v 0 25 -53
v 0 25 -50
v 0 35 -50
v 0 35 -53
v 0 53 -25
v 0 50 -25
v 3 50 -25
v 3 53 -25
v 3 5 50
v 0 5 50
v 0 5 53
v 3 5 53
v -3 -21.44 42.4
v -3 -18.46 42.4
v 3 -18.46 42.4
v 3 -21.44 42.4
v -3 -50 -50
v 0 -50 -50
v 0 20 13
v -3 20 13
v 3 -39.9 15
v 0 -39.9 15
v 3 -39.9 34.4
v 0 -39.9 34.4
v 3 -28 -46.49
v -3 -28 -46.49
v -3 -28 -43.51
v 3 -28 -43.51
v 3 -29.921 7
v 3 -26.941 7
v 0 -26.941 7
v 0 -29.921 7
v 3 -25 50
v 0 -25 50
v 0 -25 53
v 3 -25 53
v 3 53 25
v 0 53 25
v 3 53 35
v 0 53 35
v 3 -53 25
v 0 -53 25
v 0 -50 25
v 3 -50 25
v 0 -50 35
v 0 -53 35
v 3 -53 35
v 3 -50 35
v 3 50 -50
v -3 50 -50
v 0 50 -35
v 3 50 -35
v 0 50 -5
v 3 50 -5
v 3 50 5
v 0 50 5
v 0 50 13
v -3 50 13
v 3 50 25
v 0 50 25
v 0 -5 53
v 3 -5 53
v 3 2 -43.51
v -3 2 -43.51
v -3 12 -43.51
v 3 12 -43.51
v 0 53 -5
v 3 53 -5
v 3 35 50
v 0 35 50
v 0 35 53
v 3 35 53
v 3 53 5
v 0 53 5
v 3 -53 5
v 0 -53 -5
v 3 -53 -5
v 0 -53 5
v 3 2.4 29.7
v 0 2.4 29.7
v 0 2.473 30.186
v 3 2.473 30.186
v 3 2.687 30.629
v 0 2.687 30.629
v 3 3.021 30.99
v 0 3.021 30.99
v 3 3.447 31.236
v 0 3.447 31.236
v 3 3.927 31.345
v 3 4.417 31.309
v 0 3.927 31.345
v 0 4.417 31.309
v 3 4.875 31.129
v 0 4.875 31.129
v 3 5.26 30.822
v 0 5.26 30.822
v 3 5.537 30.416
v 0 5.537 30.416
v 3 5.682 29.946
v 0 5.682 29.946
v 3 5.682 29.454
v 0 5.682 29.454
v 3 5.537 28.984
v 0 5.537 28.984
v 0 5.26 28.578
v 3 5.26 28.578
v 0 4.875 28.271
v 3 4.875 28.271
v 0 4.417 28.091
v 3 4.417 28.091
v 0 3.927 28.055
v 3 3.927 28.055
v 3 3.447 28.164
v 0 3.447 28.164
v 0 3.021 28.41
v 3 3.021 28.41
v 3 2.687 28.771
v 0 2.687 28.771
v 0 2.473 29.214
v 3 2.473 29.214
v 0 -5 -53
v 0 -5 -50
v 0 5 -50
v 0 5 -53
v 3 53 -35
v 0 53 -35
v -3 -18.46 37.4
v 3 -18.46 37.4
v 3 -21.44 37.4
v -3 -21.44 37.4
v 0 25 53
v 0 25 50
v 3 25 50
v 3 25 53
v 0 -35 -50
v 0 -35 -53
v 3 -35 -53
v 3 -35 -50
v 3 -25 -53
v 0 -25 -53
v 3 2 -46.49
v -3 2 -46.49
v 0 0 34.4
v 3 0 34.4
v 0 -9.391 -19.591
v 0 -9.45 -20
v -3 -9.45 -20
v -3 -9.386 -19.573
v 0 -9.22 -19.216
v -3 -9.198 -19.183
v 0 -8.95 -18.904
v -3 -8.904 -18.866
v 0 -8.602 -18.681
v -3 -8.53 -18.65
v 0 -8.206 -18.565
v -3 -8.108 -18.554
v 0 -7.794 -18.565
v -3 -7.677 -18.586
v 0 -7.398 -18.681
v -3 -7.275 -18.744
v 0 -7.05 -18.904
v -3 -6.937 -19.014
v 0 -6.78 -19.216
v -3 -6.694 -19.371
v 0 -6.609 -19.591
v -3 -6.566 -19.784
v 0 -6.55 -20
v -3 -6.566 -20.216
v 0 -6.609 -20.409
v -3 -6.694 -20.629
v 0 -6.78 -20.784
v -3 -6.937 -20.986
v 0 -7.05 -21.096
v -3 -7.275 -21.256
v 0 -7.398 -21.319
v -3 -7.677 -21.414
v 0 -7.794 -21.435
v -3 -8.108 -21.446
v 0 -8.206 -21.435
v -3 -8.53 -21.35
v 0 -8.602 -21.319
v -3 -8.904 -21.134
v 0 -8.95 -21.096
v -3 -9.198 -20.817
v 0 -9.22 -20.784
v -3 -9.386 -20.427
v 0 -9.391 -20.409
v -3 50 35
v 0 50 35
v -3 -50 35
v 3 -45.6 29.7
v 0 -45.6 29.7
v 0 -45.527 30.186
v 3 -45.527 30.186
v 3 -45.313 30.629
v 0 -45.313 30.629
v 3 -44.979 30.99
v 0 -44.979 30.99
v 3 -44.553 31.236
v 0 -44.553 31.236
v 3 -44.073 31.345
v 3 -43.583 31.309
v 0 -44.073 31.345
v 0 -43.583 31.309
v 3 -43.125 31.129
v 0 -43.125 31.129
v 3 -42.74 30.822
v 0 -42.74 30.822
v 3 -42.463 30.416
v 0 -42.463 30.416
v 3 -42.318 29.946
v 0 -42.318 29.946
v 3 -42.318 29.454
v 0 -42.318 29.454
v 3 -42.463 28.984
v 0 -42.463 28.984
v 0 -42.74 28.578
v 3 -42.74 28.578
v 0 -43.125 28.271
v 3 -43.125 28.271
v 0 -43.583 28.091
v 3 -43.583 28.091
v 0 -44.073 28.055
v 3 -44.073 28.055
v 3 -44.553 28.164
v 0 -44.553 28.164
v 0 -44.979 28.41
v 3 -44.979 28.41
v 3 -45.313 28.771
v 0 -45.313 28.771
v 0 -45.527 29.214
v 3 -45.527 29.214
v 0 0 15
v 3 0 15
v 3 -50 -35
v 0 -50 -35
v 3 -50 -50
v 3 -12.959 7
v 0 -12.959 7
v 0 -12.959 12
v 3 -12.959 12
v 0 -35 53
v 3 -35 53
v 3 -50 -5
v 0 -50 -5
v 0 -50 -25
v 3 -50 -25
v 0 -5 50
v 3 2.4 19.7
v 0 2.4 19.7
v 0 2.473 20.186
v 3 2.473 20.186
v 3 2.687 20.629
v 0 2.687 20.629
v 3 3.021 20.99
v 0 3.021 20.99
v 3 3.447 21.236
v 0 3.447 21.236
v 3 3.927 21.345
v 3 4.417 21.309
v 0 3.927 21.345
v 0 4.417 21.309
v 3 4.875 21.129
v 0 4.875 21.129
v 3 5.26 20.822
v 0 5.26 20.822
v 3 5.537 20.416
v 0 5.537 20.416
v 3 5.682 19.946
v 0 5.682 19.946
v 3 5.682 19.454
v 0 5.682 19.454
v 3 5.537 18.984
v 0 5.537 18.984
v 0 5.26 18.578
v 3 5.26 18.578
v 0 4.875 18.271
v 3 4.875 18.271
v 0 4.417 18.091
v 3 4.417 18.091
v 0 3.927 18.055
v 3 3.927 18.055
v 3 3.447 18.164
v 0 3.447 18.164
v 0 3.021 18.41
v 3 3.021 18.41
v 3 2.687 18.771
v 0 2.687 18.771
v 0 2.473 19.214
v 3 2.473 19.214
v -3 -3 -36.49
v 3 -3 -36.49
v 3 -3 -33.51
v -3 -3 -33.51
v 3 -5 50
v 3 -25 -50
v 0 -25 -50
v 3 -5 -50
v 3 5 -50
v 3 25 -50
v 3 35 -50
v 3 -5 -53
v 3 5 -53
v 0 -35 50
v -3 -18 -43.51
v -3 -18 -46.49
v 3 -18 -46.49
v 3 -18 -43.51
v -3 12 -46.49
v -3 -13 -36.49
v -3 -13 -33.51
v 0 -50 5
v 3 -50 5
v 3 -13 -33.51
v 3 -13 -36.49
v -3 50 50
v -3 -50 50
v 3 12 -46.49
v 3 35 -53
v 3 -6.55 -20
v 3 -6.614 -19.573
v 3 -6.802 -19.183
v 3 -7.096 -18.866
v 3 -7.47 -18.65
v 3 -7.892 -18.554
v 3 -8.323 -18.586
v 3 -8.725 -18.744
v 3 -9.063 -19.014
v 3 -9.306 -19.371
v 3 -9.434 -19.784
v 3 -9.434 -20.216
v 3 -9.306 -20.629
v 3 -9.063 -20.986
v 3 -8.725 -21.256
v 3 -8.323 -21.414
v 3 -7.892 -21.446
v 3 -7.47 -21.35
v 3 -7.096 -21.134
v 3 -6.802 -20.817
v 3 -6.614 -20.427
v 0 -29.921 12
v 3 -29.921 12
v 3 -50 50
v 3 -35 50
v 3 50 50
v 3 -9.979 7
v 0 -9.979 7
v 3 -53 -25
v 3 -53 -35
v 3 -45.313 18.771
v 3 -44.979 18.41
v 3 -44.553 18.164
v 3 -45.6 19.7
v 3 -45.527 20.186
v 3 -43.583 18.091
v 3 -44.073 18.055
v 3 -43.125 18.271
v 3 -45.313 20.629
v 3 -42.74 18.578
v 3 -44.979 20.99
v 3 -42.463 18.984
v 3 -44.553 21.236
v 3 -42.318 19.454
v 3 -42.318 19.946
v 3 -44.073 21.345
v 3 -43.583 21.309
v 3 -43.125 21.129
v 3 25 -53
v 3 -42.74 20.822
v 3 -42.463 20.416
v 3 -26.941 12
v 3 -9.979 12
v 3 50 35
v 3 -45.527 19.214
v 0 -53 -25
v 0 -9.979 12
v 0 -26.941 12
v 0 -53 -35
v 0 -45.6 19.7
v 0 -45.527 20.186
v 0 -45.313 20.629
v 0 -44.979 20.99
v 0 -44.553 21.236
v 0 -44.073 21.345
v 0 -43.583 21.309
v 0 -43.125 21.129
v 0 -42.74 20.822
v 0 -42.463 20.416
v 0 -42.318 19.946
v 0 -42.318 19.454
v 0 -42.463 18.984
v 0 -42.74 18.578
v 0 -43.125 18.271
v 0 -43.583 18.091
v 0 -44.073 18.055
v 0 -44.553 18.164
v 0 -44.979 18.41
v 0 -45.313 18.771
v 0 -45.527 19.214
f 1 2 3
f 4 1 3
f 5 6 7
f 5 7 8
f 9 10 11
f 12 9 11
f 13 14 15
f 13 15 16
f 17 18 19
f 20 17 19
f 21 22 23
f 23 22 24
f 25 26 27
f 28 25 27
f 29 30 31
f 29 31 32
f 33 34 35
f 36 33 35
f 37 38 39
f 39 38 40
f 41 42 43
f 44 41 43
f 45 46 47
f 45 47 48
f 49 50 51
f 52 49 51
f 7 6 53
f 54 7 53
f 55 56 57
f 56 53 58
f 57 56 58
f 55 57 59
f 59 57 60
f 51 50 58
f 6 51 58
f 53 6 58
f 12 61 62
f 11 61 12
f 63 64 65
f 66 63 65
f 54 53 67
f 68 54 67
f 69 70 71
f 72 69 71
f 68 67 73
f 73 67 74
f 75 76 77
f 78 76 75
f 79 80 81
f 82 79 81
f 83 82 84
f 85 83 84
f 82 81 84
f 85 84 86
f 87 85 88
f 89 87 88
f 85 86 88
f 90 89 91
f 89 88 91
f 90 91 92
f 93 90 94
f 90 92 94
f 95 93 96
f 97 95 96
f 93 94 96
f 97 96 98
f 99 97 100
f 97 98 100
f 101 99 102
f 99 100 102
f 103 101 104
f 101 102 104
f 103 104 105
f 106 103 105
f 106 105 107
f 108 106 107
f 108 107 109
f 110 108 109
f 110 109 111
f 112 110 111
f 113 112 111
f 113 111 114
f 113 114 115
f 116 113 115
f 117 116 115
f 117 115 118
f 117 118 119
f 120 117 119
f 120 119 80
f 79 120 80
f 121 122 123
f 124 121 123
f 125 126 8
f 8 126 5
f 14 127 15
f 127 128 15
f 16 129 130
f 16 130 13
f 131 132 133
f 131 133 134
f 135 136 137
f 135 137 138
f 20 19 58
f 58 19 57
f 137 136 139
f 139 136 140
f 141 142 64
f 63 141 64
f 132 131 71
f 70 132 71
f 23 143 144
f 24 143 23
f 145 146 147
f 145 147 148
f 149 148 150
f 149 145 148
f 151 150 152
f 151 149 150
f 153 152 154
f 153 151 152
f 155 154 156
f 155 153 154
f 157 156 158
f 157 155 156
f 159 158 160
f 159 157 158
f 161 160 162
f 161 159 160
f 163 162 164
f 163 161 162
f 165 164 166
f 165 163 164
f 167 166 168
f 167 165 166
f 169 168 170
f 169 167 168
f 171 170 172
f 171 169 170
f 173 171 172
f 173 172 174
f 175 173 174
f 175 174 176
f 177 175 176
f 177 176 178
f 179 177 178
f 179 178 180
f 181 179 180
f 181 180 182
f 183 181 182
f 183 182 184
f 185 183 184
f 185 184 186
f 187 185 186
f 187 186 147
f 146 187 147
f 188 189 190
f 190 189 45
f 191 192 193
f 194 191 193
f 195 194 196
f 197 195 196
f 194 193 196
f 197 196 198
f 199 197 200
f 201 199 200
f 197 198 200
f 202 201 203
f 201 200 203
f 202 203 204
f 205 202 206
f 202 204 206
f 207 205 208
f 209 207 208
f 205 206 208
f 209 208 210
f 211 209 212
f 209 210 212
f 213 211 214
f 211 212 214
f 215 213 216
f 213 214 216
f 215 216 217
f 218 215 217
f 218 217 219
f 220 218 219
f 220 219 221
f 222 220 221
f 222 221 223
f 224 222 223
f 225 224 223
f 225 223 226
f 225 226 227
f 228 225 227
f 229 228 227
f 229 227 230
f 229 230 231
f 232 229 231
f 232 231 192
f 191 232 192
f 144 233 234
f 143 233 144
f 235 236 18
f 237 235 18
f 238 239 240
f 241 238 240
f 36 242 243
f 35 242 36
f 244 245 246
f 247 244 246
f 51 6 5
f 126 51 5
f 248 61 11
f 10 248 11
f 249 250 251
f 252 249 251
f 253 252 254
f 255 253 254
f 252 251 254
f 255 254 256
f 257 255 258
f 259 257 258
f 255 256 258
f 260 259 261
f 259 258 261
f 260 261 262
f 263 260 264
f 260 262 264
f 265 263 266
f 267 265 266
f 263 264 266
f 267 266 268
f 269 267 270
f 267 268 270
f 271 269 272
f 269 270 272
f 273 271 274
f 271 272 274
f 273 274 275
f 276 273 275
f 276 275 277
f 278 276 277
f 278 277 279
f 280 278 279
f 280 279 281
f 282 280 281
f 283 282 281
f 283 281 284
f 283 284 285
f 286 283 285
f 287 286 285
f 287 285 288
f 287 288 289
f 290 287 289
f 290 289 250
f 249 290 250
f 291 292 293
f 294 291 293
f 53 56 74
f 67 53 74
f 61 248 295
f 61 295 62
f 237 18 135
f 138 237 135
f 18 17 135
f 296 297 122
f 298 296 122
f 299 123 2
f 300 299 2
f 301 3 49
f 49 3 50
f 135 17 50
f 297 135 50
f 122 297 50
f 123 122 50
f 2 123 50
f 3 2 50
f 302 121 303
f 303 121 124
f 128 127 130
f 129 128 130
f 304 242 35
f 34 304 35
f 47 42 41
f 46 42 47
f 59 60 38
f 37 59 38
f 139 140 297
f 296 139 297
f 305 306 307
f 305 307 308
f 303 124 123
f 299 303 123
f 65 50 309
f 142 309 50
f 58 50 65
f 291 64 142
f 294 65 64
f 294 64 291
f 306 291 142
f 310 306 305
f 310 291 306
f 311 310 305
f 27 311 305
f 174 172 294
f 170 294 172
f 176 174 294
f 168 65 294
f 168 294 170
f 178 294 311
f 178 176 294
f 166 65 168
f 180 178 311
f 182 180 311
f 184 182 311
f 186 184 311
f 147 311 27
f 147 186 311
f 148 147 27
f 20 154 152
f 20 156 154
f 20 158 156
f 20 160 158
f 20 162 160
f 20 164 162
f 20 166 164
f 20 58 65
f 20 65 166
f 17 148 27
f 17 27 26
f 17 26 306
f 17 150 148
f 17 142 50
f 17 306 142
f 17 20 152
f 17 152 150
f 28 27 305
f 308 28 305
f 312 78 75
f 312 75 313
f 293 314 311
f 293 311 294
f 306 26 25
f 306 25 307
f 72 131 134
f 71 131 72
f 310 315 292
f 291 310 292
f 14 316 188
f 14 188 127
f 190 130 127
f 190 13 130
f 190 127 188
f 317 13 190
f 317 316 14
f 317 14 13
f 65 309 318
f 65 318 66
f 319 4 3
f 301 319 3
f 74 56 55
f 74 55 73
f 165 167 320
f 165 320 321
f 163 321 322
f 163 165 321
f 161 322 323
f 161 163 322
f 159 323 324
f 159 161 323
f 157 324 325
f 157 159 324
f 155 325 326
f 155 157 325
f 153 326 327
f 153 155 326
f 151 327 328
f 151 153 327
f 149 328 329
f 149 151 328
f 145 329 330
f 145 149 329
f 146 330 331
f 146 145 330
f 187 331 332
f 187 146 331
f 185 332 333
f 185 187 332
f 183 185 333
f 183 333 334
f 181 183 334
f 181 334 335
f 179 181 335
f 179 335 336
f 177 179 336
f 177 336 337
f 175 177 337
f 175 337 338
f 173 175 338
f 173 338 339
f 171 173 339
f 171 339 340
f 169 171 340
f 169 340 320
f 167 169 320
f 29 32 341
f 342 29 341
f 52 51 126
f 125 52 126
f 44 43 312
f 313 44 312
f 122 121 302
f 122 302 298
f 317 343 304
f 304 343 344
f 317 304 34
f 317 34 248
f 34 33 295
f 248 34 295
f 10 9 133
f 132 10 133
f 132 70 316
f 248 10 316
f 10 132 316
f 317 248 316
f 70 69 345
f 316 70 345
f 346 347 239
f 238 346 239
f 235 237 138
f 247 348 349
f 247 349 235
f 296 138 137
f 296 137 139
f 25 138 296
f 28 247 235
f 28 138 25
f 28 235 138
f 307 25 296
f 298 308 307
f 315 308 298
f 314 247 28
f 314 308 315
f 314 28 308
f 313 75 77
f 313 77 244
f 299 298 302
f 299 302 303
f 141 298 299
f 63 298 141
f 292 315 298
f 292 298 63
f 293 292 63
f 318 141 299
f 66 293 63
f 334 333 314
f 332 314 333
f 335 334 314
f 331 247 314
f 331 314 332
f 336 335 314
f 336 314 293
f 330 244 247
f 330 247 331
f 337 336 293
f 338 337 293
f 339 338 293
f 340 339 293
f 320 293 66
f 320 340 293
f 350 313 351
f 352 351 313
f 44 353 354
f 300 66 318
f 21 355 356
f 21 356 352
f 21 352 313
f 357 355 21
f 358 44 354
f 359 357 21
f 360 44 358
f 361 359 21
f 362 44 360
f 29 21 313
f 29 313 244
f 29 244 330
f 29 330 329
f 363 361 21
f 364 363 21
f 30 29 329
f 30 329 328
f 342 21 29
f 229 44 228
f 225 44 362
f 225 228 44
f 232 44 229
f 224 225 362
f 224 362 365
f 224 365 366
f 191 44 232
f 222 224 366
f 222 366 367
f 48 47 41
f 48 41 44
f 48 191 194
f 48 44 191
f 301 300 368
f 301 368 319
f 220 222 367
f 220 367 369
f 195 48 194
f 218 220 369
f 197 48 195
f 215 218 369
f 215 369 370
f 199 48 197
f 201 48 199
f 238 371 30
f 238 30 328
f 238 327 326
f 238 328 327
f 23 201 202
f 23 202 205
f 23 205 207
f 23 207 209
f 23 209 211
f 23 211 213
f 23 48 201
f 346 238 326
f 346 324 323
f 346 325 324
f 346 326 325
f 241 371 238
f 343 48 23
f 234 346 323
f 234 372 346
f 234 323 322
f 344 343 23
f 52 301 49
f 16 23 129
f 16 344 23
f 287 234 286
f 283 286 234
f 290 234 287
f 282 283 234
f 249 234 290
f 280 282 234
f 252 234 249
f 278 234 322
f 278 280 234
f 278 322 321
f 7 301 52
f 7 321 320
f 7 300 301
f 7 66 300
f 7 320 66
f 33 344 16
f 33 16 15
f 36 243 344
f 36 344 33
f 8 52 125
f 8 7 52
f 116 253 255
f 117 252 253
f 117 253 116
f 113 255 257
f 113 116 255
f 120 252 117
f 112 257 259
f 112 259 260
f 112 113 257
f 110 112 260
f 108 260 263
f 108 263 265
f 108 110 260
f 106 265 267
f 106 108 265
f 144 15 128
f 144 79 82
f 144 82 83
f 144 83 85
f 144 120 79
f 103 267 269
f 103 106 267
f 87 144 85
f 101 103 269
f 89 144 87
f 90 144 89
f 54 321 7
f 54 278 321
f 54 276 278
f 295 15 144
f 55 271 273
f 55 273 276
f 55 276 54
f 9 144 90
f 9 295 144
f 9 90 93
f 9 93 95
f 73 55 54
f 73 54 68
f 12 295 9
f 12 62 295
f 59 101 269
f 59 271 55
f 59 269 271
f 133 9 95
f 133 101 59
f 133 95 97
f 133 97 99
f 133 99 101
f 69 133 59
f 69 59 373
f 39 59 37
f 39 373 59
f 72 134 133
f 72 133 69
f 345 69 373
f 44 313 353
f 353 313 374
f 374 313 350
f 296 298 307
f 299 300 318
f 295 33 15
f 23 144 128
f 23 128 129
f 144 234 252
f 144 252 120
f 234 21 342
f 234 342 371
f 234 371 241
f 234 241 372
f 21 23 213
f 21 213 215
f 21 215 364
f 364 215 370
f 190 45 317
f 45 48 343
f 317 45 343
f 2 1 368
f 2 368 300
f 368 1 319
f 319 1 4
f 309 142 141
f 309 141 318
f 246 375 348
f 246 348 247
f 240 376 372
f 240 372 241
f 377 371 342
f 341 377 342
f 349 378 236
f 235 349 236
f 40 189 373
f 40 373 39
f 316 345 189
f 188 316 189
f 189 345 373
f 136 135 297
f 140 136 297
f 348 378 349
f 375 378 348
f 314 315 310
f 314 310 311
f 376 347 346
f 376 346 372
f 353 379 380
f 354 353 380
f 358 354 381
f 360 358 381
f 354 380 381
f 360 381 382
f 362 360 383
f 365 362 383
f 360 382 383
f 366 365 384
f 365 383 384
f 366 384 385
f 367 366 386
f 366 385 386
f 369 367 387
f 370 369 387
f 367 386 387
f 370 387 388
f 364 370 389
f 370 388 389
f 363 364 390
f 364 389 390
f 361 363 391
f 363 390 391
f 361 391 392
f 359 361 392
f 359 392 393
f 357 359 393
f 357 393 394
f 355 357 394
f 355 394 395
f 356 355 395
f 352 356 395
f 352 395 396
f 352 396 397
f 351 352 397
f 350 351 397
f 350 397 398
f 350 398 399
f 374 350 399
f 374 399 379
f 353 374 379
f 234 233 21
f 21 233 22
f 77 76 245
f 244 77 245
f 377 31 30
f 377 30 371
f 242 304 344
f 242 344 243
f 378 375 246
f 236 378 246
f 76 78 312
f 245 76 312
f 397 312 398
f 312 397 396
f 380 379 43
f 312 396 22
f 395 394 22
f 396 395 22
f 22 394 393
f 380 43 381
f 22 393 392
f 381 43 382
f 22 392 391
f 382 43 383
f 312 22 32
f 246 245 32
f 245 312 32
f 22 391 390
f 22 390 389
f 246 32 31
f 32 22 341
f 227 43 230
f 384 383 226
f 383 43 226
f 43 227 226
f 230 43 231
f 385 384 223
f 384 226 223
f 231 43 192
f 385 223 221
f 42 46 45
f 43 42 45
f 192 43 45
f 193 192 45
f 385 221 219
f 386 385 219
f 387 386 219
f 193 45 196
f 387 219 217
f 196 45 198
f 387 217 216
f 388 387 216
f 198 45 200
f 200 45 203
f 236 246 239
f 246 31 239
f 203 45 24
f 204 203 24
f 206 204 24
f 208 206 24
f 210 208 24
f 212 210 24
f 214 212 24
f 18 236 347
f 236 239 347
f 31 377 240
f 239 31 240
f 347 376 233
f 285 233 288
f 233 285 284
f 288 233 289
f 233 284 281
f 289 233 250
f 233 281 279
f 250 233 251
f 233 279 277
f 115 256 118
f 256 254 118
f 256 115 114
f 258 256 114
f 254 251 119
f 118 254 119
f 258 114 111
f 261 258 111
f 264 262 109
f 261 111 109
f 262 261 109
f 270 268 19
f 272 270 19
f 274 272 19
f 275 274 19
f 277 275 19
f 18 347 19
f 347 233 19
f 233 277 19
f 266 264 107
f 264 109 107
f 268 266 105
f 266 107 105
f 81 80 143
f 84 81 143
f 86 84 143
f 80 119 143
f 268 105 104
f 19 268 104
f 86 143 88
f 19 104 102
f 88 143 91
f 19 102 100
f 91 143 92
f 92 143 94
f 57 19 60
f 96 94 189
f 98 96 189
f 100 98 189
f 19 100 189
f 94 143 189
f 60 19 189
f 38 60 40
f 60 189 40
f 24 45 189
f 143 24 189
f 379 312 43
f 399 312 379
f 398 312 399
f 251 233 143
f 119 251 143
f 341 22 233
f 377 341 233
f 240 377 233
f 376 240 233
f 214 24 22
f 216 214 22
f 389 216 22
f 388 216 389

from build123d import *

# Parameters (mm, degrees)
F0_R     = 1.45
F0_W     = 10
F0_H     = 3
F0_W_2   = 3
F0_H_2   = 10
F1_DEPTH = 3
F2_R     = 1.65
F2_W     = 2.98
F2_H     = 5
F2_W_2   = 39.9
F2_H_2   = 19.4
F3_DEPTH = 25
F2_R_2   = 1.45
F4_DEPTH = 3
F5_W     = 10
F5_H     = 2.98
F6_DEPTH = 12.5


with BuildPart() as f1:
    # F0 (on Right) → F1 (new body)
    with BuildSketch(Plane.YZ):
        Polygon((-35, 50), (-50, 50), (-50, 35), (-47, 35), (-47, 25), (-50, 25), (-50, 5), (-47, 5), (-47, -5), (-50, -5), (-50, -25), (-47, -25), (-47, -35), (-50, -35), (-50, -50), (-35, -50), (-35, -47), (-25, -47), (-25, -50), (-5, -50), (-5, -47), (5, -47), (5, -50), (25, -50), (25, -47), (35, -47), (35, -50), (50, -50), (50, -35), (47, -35), (47, -25), (50, -25), (50, -5), (47, -5), (47, 5), (50, 5), (50, 25), (47, 25), (47, 35), (50, 35), (50, 50), (35, 50), (35, 47), (25, 47), (25, 50), (5, 50), (5, 47), (-5, 47), (-5, 50), (-25, 50), (-25, 47), (-35, 47), align=None)
        with Locations((-8, -20)):
            Circle(F0_R, mode=Mode.SUBTRACT)
        with Locations((-30, 51.5)):
            Rectangle(F0_W, F0_H)
        with Locations((-30, 48.5)):
            Rectangle(F0_W, F0_H)
        with Locations((-48.5, 30)):
            Rectangle(F0_W_2, F0_H_2)
        with Locations((-51.5, 30)):
            Rectangle(F0_W_2, F0_H_2)
        with Locations((0, 51.5)):
            Rectangle(F0_W, F0_H)
        with Locations((0, 48.5)):
            Rectangle(F0_W, F0_H)
        with Locations((-48.5, 0)):
            Rectangle(F0_W_2, F0_H_2)
        with Locations((-51.5, 0)):
            Rectangle(F0_W_2, F0_H_2)
        with Locations((30, 51.5)):
            Rectangle(F0_W, F0_H)
        with Locations((30, 48.5)):
            Rectangle(F0_W, F0_H)
        with Locations((-48.5, -30)):
            Rectangle(F0_W_2, F0_H_2)
        with Locations((-51.5, -30)):
            Rectangle(F0_W_2, F0_H_2)
        with Locations((51.5, 30)):
            Rectangle(F0_W_2, F0_H_2)
        with Locations((48.5, 30)):
            Rectangle(F0_W_2, F0_H_2)
        with Locations((-30, -48.5)):
            Rectangle(F0_W, F0_H)
        with Locations((-30, -51.5)):
            Rectangle(F0_W, F0_H)
        with Locations((51.5, 0)):
            Rectangle(F0_W_2, F0_H_2)
        with Locations((48.5, 0)):
            Rectangle(F0_W_2, F0_H_2)
        with Locations((0, -48.5)):
            Rectangle(F0_W, F0_H)
        with Locations((0, -51.5)):
            Rectangle(F0_W, F0_H)
        with Locations((51.5, -30)):
            Rectangle(F0_W_2, F0_H_2)
        with Locations((48.5, -30)):
            Rectangle(F0_W_2, F0_H_2)
        with Locations((30, -48.5)):
            Rectangle(F0_W, F0_H)
        with Locations((30, -51.5)):
            Rectangle(F0_W, F0_H)
    extrude(amount=F1_DEPTH)

    # F2 (on face) → F3 (cut)
    with BuildSketch(Plane(origin=(0, 0, 0), x_dir=(0, -1, 0), z_dir=(-1, 0, 0))):
        with Locations((-4.05, 29.7)):
            Circle(F2_R)
        with Locations((-4.05, 19.7)):
            Circle(F2_R)
        with Locations((43.95, 29.7)):
            Circle(F2_R)
        with Locations((43.95, 19.7)):
            Circle(F2_R)
        with Locations((11.4694618905, 9.5)):
            Rectangle(F2_W, F2_H)
        with Locations((28.4305381095, 9.5)):
            Rectangle(F2_W, F2_H)
        with Locations((19.95, 24.7)):
            Rectangle(F2_W_2, F2_H_2)
        with Locations((19.95, 39.9)):
            Rectangle(F2_W, F2_H)
    extrude(amount=-F3_DEPTH, mode=Mode.SUBTRACT)

    # F2 (on face) → F4 (join)
    with BuildSketch(Plane(origin=(0, 0, 0), x_dir=(0, -1, 0), z_dir=(-1, 0, 0))):
        Polygon((-50, 50), (-50, 35), (50, 35), (50, 50), (35, 50), (25, 50), (5, 50), (-5, 50), (-25, 50), (-35, 50), align=None)
        with Locations((19.95, 39.9)):
            Rectangle(F2_W, F2_H, mode=Mode.SUBTRACT)
        Polygon((-50, -35), (-50, -50), (-35, -50), (-25, -50), (-5, -50), (5, -50), (25, -50), (35, -50), (50, -50), (-20, 13), (-50, 13), (-50, 5), (-50, -5), (-50, -25), align=None)
        with Locations((8, -20)):
            Circle(F2_R_2, mode=Mode.SUBTRACT)
    extrude(amount=F4_DEPTH)

    # F5 (on Right) → F6 (cut, symmetric)
    with BuildSketch(Plane.YZ):
        with Locations((7, -45)):
            Rectangle(F5_W, F5_H)
        with Locations((-23, -45)):
            Rectangle(F5_W, F5_H)
        with Locations((-8, -35)):
            Rectangle(F5_W, F5_H)
    extrude(amount=F6_DEPTH, both=True, mode=Mode.SUBTRACT)


solid = f1.part
